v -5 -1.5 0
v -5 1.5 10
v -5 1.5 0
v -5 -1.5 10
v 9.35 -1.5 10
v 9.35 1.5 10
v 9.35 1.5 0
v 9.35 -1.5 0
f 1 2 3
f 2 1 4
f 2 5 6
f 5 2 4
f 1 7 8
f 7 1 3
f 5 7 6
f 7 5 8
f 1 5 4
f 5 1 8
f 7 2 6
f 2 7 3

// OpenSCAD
// Built by bench/smallmodels/features/compiler.py from a list of features.
$fn = 64;
difference() {
  union() {
    translate([0, 0, 0]) linear_extrude(height = 10) polygon([[-9.35, -1.5], [9.35, -1.5], [9.35, 1.5], [-9.35, 1.5]]);
  }
  union() {
    translate([-10, 0, 0]) rotate([0, 0, 0]) translate([-5, -5, 0]) cube([10, 10, 10]);
    translate([20, 0, 0]) rotate([0, 0, 0]) translate([-5, -2.5, 0]) cube([10, 5, 10]);
  }
}
